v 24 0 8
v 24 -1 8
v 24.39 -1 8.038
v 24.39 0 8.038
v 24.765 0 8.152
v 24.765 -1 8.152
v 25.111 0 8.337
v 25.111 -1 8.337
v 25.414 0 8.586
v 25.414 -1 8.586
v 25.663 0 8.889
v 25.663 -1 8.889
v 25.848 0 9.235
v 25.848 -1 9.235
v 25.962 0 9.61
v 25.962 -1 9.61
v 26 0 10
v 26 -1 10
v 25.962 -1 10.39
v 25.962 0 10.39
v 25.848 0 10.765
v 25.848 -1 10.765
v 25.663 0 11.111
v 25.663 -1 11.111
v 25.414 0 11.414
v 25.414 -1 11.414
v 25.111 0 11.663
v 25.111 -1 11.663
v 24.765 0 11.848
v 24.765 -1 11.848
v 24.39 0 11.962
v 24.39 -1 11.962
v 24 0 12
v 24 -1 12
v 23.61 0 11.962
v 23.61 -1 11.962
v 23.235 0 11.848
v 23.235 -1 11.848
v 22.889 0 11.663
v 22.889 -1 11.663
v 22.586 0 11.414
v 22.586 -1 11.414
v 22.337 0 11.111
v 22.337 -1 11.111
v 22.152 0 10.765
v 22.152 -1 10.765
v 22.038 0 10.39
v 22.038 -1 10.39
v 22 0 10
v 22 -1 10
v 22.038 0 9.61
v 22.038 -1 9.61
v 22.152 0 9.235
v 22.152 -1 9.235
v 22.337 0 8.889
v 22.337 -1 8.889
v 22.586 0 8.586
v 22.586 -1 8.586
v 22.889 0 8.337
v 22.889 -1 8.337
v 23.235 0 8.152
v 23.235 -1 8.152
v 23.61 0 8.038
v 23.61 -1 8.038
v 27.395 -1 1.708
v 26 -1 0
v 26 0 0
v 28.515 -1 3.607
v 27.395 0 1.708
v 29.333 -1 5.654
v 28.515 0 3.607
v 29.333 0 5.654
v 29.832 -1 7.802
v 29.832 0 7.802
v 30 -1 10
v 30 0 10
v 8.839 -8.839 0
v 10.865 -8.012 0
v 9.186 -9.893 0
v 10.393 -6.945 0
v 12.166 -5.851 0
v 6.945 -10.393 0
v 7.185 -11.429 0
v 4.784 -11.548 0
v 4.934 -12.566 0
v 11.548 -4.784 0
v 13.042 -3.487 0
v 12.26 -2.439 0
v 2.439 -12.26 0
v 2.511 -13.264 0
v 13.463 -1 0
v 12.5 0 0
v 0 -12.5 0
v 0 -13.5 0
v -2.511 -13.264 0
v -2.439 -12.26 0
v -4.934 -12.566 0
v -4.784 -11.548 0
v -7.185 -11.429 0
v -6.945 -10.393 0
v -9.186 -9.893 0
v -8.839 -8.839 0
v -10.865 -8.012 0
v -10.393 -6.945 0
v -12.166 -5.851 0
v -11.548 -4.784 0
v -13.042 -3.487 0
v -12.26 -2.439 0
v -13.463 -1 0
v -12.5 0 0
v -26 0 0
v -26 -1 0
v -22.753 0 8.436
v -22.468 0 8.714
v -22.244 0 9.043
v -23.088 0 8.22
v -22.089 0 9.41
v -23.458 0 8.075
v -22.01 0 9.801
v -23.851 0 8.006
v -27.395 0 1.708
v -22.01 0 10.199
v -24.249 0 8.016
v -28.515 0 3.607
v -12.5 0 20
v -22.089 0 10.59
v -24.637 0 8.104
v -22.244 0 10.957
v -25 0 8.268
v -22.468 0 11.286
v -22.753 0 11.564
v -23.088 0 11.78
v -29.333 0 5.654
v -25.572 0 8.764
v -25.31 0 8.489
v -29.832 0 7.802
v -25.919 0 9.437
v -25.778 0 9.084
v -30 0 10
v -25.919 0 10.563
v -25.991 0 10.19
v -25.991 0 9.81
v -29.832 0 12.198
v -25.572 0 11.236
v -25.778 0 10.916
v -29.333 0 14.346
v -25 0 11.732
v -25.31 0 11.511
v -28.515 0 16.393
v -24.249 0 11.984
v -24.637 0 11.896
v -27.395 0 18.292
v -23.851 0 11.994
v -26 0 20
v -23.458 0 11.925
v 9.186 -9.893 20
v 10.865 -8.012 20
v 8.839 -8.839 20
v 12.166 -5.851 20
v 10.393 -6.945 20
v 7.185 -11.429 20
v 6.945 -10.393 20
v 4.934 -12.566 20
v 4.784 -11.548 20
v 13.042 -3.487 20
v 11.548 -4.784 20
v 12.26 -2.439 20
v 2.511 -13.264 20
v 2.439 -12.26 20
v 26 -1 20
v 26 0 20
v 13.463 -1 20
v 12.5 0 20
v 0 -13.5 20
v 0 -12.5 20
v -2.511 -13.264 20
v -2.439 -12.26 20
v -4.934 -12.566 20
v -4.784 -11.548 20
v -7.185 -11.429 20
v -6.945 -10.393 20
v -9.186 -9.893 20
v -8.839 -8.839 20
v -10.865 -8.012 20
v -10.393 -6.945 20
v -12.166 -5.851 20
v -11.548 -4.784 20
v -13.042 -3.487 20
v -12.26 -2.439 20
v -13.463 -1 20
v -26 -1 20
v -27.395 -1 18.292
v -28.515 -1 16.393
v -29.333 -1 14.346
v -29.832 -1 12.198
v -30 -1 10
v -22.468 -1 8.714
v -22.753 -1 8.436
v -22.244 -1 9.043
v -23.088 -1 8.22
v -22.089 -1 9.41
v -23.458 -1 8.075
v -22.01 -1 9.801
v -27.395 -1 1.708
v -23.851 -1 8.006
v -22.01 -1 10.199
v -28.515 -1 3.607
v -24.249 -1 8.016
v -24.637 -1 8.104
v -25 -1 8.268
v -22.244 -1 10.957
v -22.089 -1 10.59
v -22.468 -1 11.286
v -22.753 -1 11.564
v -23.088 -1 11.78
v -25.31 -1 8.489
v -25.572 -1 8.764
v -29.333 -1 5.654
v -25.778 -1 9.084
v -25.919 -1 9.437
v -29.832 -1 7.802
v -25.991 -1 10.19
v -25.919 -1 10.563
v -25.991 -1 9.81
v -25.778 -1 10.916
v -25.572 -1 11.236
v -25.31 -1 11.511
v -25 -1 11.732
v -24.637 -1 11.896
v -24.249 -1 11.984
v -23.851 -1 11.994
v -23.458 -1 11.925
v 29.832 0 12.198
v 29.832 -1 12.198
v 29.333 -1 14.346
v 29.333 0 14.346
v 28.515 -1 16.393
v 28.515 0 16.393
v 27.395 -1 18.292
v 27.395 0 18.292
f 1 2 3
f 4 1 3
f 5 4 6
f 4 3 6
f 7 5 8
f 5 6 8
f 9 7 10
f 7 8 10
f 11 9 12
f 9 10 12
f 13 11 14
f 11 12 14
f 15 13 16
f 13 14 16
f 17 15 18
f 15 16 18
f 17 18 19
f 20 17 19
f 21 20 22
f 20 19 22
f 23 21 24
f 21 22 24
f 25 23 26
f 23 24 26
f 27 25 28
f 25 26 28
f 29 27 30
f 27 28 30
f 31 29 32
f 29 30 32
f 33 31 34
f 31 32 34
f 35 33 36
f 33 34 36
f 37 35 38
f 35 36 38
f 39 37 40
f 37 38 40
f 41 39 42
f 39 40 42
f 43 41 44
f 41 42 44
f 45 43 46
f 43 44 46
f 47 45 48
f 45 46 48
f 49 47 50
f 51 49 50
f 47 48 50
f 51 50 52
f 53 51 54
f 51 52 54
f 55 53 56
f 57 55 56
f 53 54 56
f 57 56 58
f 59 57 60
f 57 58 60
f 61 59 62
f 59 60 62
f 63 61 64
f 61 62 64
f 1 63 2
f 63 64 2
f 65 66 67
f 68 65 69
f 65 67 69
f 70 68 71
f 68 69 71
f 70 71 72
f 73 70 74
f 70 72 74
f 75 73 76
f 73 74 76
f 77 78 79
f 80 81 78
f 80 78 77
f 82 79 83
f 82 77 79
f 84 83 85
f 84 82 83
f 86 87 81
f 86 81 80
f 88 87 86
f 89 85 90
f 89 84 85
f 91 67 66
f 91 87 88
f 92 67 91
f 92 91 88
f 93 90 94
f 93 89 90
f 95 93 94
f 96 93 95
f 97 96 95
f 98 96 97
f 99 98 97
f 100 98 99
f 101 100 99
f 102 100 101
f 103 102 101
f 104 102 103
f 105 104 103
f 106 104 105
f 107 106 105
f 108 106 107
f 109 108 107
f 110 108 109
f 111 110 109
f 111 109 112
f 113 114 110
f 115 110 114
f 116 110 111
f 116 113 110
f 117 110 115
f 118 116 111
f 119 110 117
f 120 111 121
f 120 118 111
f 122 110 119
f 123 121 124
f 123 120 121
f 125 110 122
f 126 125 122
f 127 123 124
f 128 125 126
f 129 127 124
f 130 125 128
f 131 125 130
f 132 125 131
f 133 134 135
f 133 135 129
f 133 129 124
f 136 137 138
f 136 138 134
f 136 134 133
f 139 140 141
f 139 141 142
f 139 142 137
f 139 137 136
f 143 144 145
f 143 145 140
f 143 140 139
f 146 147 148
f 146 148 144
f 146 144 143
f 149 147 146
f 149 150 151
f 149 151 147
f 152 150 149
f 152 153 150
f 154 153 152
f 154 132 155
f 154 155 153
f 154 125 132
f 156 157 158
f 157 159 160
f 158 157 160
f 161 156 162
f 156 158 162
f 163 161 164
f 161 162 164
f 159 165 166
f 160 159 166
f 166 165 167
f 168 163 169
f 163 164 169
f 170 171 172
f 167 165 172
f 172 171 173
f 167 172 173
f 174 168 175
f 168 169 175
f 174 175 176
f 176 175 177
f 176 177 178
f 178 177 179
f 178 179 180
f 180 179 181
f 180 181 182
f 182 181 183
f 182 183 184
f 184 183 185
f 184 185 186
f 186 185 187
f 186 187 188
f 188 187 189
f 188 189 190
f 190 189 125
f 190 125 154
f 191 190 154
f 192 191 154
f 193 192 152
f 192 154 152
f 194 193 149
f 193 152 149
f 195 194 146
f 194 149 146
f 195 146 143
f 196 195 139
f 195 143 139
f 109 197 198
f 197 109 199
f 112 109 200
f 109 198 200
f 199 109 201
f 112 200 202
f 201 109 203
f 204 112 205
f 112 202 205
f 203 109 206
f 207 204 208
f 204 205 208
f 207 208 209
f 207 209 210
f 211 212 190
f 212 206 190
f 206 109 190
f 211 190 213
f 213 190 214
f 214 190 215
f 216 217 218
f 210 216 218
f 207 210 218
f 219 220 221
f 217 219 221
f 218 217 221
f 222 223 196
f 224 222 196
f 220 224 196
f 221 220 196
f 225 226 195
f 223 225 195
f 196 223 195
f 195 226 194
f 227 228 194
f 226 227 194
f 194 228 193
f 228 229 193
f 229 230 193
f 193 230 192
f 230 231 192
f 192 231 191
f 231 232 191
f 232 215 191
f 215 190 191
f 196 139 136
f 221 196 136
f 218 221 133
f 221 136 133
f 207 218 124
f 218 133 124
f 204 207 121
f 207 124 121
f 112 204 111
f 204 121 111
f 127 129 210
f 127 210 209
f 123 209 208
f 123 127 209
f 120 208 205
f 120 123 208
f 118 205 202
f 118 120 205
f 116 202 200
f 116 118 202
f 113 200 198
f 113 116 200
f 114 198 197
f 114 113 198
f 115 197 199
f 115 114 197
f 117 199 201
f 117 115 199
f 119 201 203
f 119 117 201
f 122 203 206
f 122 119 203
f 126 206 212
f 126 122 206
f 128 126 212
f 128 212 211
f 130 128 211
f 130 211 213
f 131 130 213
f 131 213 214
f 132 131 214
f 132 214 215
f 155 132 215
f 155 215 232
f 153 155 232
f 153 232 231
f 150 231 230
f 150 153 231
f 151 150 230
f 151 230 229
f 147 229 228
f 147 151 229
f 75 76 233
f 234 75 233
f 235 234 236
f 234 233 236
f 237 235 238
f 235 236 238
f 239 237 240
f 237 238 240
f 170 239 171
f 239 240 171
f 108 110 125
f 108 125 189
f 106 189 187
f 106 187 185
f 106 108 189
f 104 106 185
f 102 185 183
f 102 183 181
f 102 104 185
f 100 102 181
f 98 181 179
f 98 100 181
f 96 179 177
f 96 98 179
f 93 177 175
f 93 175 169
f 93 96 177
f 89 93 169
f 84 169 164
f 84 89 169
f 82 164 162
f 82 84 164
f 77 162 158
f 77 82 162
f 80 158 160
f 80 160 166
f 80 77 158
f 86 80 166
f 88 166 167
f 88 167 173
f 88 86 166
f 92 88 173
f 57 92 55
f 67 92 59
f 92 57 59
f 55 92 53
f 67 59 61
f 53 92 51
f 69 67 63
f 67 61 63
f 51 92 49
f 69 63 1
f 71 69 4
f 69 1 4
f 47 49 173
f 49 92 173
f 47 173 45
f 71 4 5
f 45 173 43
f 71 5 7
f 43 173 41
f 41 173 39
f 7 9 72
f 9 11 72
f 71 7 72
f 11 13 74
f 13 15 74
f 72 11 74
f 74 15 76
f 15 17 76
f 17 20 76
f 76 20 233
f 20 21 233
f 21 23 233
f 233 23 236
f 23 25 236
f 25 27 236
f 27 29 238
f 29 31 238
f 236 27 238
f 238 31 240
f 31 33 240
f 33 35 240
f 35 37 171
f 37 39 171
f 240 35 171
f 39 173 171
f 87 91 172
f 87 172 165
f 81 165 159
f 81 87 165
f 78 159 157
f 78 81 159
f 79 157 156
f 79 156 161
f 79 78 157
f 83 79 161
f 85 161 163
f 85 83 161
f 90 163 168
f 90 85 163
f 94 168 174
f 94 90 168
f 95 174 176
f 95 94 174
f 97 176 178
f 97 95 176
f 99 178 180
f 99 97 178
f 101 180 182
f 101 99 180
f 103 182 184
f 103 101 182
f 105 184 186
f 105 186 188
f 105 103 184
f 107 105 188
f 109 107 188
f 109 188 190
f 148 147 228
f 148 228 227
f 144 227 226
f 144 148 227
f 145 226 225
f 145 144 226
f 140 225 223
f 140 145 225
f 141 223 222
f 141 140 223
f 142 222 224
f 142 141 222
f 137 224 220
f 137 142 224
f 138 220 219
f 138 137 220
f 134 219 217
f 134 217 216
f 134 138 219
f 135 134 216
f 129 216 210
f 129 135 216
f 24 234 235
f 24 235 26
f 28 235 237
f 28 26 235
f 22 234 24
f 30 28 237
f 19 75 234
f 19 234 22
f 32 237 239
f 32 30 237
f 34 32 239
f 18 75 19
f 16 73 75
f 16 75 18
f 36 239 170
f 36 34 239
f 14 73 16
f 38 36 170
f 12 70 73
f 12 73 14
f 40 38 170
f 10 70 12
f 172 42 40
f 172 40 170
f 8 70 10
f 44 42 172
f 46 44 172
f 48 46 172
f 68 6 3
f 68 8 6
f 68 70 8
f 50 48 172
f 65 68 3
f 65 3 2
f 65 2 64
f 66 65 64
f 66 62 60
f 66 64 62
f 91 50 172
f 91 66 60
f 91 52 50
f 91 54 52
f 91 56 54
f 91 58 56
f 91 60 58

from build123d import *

# Parameters (mm, degrees)
BOSS_EXTRUDE1_DEPTH   = 20
SKETCH2_R             = 2
CUT_EXTRUDE1_DEPTH    = 20
SKETCH3_R             = 2
BOSS_EXTRUDE3_DEPTH   = 20
BOSS_EXTRUDE3_2_DEPTH = 20
CUT_EXTRUDE3_START    = -20
SKETCH4_R             = 2
CUT_EXTRUDE3_DEPTH    = 20
CUT_EXTRUDE4_START    = -29
SKETCH4_2_R           = 2
CUT_EXTRUDE4_DEPTH    = 29
CUT_EXTRUDE6_START    = -20
CUT_EXTRUDE6_DEPTH    = 20
BOSS_EXTRUDE4_START   = -1
BOSS_EXTRUDE4_DEPTH   = 1
BOSS_EXTRUDE5_START   = -1
SKETCH7_R             = 2
BOSS_EXTRUDE5_DEPTH   = 1
SKETCH8_R             = 2
CUT_EXTRUDE7_DEPTH    = 1


with BuildPart() as part:
    # Sketch1 → Boss-Extrude1 (new body)
    with BuildSketch(Plane.XY):
        with BuildLine():
            Line((12.5, 0), (30, 0))
            Line((30, 0), (30, -1))
            Line((30, -1), (13.462912018, -1))
            ThreePointArc((13.462912018, -1), (0, -13.5), (-13.462912018, -1))
            Line((-13.462912018, -1), (-30, -1))
            Line((-30, -1), (-30, 0))
            Line((-30, 0), (-12.5, 0))
            ThreePointArc((-12.5, 0), (0, -12.5), (12.5, 0))
        make_face()
    extrude(amount=BOSS_EXTRUDE1_DEPTH)

    # Sketch2 → Cut-Extrude1 (cut)
    with BuildSketch(Plane(origin=(0, 0, 0), x_dir=(1, 0, 0), z_dir=(0, 1, 0))):
        with BuildLine():
            Line((30, 0), (26, 0))
            ThreePointArc((26, 0), (28.962912018, -4.614835193), (30, -10))
            Line((30, -10), (30, 0))
        make_face()
        with BuildLine():
            ThreePointArc((30, -10), (28.962912018, -15.385164807), (26, -20))
            Line((26, -20), (30, -20))
            Line((30, -20), (30, -10))
        make_face()
        with BuildLine():
            Line((-30, 0), (-30, -9.99999978))
            ThreePointArc((-30, -9.99999978), (-28.962911977, -4.614835091), (-26, 0))
            Line((-26, 0), (-30, 0))
        make_face()
        with BuildLine():
            Line((-30, -20), (-26, -20))
            ThreePointArc((-26, -20), (-28.962912059, -15.385164705), (-30, -9.99999978))
            Line((-30, -9.99999978), (-30, -20))
        make_face()
        with Locations((-26, -10)):
            Circle(SKETCH2_R)
        with Locations((20, -10)):
            Circle(SKETCH2_R)
    extrude(amount=-CUT_EXTRUDE1_DEPTH, mode=Mode.SUBTRACT)

    # Sketch4<2> → Cut-Extrude4 (cut)
    with BuildSketch(Plane.XZ.offset(21).offset(CUT_EXTRUDE4_START)):
        with Locations((20, 10)):
            Circle(SKETCH4_2_R)
        with Locations((-24, 10)):
            Circle(SKETCH4_2_R)
    extrude(amount=CUT_EXTRUDE4_DEPTH, mode=Mode.SUBTRACT)

    # Sketch6 → Boss-Extrude4 (add)
    with BuildSketch(Plane.XZ.offset(1).offset(BOSS_EXTRUDE4_START)):
        with BuildLine():
            ThreePointArc((-25, 8.267949192), (-26, 10), (-25, 11.732050808))
            ThreePointArc((-25, 11.732050808), (-28, 10), (-25, 8.267949192))
        make_face()
    extrude(amount=BOSS_EXTRUDE4_DEPTH)

    # Sketch7 → Boss-Extrude5 (add)
    with BuildSketch(Plane.XZ.offset(1).offset(BOSS_EXTRUDE5_START)):
        with Locations((20, 10)):
            Circle(SKETCH7_R)
    extrude(amount=BOSS_EXTRUDE5_DEPTH)

    # Sketch8 → Cut-Extrude7 (cut)
    with BuildSketch(Plane.XZ.offset(1)):
        with Locations((24, 10)):
            Circle(SKETCH8_R)
    extrude(amount=-CUT_EXTRUDE7_DEPTH, mode=Mode.SUBTRACT)


with BuildPart() as body_2:
    # Sketch3 → Boss-Extrude3 (new body)
    with BuildSketch(Plane.XZ.offset(1)):
        with Locations((20, 10)):
            Circle(SKETCH3_R)
    extrude(amount=BOSS_EXTRUDE3_DEPTH)

    # Sketch4 → Cut-Extrude3 (cut)
    with BuildSketch(Plane.XZ.offset(21).offset(CUT_EXTRUDE3_START)):
        with Locations((20, 10)):
            Circle(SKETCH4_R)
        with Locations((-24, 10)):
            Circle(SKETCH4_R)
    extrude(amount=CUT_EXTRUDE3_DEPTH, mode=Mode.SUBTRACT)


with BuildPart() as body_3:
    # Sketch3 → Boss-Extrude3 2 (new body)
    with BuildSketch(Plane.XZ.offset(1)):
        with BuildLine():
            ThreePointArc((-25, 8.267949192), (-26, 10), (-25, 11.732050808))
            ThreePointArc((-25, 11.732050808), (-28, 10), (-25, 8.267949192))
        make_face()
    extrude(amount=BOSS_EXTRUDE3_2_DEPTH)

    # Sketch5 → Cut-Extrude6 (cut)
    with BuildSketch(Plane.XZ.offset(21).offset(CUT_EXTRUDE6_START)):
        with BuildLine():
            ThreePointArc((-25, 8.267949192), (-26, 10), (-25, 11.732050808))
            ThreePointArc((-25, 11.732050808), (-28, 10), (-25, 8.267949192))
        make_face()
    extrude(amount=CUT_EXTRUDE6_DEPTH, mode=Mode.SUBTRACT)


solid = part.part
